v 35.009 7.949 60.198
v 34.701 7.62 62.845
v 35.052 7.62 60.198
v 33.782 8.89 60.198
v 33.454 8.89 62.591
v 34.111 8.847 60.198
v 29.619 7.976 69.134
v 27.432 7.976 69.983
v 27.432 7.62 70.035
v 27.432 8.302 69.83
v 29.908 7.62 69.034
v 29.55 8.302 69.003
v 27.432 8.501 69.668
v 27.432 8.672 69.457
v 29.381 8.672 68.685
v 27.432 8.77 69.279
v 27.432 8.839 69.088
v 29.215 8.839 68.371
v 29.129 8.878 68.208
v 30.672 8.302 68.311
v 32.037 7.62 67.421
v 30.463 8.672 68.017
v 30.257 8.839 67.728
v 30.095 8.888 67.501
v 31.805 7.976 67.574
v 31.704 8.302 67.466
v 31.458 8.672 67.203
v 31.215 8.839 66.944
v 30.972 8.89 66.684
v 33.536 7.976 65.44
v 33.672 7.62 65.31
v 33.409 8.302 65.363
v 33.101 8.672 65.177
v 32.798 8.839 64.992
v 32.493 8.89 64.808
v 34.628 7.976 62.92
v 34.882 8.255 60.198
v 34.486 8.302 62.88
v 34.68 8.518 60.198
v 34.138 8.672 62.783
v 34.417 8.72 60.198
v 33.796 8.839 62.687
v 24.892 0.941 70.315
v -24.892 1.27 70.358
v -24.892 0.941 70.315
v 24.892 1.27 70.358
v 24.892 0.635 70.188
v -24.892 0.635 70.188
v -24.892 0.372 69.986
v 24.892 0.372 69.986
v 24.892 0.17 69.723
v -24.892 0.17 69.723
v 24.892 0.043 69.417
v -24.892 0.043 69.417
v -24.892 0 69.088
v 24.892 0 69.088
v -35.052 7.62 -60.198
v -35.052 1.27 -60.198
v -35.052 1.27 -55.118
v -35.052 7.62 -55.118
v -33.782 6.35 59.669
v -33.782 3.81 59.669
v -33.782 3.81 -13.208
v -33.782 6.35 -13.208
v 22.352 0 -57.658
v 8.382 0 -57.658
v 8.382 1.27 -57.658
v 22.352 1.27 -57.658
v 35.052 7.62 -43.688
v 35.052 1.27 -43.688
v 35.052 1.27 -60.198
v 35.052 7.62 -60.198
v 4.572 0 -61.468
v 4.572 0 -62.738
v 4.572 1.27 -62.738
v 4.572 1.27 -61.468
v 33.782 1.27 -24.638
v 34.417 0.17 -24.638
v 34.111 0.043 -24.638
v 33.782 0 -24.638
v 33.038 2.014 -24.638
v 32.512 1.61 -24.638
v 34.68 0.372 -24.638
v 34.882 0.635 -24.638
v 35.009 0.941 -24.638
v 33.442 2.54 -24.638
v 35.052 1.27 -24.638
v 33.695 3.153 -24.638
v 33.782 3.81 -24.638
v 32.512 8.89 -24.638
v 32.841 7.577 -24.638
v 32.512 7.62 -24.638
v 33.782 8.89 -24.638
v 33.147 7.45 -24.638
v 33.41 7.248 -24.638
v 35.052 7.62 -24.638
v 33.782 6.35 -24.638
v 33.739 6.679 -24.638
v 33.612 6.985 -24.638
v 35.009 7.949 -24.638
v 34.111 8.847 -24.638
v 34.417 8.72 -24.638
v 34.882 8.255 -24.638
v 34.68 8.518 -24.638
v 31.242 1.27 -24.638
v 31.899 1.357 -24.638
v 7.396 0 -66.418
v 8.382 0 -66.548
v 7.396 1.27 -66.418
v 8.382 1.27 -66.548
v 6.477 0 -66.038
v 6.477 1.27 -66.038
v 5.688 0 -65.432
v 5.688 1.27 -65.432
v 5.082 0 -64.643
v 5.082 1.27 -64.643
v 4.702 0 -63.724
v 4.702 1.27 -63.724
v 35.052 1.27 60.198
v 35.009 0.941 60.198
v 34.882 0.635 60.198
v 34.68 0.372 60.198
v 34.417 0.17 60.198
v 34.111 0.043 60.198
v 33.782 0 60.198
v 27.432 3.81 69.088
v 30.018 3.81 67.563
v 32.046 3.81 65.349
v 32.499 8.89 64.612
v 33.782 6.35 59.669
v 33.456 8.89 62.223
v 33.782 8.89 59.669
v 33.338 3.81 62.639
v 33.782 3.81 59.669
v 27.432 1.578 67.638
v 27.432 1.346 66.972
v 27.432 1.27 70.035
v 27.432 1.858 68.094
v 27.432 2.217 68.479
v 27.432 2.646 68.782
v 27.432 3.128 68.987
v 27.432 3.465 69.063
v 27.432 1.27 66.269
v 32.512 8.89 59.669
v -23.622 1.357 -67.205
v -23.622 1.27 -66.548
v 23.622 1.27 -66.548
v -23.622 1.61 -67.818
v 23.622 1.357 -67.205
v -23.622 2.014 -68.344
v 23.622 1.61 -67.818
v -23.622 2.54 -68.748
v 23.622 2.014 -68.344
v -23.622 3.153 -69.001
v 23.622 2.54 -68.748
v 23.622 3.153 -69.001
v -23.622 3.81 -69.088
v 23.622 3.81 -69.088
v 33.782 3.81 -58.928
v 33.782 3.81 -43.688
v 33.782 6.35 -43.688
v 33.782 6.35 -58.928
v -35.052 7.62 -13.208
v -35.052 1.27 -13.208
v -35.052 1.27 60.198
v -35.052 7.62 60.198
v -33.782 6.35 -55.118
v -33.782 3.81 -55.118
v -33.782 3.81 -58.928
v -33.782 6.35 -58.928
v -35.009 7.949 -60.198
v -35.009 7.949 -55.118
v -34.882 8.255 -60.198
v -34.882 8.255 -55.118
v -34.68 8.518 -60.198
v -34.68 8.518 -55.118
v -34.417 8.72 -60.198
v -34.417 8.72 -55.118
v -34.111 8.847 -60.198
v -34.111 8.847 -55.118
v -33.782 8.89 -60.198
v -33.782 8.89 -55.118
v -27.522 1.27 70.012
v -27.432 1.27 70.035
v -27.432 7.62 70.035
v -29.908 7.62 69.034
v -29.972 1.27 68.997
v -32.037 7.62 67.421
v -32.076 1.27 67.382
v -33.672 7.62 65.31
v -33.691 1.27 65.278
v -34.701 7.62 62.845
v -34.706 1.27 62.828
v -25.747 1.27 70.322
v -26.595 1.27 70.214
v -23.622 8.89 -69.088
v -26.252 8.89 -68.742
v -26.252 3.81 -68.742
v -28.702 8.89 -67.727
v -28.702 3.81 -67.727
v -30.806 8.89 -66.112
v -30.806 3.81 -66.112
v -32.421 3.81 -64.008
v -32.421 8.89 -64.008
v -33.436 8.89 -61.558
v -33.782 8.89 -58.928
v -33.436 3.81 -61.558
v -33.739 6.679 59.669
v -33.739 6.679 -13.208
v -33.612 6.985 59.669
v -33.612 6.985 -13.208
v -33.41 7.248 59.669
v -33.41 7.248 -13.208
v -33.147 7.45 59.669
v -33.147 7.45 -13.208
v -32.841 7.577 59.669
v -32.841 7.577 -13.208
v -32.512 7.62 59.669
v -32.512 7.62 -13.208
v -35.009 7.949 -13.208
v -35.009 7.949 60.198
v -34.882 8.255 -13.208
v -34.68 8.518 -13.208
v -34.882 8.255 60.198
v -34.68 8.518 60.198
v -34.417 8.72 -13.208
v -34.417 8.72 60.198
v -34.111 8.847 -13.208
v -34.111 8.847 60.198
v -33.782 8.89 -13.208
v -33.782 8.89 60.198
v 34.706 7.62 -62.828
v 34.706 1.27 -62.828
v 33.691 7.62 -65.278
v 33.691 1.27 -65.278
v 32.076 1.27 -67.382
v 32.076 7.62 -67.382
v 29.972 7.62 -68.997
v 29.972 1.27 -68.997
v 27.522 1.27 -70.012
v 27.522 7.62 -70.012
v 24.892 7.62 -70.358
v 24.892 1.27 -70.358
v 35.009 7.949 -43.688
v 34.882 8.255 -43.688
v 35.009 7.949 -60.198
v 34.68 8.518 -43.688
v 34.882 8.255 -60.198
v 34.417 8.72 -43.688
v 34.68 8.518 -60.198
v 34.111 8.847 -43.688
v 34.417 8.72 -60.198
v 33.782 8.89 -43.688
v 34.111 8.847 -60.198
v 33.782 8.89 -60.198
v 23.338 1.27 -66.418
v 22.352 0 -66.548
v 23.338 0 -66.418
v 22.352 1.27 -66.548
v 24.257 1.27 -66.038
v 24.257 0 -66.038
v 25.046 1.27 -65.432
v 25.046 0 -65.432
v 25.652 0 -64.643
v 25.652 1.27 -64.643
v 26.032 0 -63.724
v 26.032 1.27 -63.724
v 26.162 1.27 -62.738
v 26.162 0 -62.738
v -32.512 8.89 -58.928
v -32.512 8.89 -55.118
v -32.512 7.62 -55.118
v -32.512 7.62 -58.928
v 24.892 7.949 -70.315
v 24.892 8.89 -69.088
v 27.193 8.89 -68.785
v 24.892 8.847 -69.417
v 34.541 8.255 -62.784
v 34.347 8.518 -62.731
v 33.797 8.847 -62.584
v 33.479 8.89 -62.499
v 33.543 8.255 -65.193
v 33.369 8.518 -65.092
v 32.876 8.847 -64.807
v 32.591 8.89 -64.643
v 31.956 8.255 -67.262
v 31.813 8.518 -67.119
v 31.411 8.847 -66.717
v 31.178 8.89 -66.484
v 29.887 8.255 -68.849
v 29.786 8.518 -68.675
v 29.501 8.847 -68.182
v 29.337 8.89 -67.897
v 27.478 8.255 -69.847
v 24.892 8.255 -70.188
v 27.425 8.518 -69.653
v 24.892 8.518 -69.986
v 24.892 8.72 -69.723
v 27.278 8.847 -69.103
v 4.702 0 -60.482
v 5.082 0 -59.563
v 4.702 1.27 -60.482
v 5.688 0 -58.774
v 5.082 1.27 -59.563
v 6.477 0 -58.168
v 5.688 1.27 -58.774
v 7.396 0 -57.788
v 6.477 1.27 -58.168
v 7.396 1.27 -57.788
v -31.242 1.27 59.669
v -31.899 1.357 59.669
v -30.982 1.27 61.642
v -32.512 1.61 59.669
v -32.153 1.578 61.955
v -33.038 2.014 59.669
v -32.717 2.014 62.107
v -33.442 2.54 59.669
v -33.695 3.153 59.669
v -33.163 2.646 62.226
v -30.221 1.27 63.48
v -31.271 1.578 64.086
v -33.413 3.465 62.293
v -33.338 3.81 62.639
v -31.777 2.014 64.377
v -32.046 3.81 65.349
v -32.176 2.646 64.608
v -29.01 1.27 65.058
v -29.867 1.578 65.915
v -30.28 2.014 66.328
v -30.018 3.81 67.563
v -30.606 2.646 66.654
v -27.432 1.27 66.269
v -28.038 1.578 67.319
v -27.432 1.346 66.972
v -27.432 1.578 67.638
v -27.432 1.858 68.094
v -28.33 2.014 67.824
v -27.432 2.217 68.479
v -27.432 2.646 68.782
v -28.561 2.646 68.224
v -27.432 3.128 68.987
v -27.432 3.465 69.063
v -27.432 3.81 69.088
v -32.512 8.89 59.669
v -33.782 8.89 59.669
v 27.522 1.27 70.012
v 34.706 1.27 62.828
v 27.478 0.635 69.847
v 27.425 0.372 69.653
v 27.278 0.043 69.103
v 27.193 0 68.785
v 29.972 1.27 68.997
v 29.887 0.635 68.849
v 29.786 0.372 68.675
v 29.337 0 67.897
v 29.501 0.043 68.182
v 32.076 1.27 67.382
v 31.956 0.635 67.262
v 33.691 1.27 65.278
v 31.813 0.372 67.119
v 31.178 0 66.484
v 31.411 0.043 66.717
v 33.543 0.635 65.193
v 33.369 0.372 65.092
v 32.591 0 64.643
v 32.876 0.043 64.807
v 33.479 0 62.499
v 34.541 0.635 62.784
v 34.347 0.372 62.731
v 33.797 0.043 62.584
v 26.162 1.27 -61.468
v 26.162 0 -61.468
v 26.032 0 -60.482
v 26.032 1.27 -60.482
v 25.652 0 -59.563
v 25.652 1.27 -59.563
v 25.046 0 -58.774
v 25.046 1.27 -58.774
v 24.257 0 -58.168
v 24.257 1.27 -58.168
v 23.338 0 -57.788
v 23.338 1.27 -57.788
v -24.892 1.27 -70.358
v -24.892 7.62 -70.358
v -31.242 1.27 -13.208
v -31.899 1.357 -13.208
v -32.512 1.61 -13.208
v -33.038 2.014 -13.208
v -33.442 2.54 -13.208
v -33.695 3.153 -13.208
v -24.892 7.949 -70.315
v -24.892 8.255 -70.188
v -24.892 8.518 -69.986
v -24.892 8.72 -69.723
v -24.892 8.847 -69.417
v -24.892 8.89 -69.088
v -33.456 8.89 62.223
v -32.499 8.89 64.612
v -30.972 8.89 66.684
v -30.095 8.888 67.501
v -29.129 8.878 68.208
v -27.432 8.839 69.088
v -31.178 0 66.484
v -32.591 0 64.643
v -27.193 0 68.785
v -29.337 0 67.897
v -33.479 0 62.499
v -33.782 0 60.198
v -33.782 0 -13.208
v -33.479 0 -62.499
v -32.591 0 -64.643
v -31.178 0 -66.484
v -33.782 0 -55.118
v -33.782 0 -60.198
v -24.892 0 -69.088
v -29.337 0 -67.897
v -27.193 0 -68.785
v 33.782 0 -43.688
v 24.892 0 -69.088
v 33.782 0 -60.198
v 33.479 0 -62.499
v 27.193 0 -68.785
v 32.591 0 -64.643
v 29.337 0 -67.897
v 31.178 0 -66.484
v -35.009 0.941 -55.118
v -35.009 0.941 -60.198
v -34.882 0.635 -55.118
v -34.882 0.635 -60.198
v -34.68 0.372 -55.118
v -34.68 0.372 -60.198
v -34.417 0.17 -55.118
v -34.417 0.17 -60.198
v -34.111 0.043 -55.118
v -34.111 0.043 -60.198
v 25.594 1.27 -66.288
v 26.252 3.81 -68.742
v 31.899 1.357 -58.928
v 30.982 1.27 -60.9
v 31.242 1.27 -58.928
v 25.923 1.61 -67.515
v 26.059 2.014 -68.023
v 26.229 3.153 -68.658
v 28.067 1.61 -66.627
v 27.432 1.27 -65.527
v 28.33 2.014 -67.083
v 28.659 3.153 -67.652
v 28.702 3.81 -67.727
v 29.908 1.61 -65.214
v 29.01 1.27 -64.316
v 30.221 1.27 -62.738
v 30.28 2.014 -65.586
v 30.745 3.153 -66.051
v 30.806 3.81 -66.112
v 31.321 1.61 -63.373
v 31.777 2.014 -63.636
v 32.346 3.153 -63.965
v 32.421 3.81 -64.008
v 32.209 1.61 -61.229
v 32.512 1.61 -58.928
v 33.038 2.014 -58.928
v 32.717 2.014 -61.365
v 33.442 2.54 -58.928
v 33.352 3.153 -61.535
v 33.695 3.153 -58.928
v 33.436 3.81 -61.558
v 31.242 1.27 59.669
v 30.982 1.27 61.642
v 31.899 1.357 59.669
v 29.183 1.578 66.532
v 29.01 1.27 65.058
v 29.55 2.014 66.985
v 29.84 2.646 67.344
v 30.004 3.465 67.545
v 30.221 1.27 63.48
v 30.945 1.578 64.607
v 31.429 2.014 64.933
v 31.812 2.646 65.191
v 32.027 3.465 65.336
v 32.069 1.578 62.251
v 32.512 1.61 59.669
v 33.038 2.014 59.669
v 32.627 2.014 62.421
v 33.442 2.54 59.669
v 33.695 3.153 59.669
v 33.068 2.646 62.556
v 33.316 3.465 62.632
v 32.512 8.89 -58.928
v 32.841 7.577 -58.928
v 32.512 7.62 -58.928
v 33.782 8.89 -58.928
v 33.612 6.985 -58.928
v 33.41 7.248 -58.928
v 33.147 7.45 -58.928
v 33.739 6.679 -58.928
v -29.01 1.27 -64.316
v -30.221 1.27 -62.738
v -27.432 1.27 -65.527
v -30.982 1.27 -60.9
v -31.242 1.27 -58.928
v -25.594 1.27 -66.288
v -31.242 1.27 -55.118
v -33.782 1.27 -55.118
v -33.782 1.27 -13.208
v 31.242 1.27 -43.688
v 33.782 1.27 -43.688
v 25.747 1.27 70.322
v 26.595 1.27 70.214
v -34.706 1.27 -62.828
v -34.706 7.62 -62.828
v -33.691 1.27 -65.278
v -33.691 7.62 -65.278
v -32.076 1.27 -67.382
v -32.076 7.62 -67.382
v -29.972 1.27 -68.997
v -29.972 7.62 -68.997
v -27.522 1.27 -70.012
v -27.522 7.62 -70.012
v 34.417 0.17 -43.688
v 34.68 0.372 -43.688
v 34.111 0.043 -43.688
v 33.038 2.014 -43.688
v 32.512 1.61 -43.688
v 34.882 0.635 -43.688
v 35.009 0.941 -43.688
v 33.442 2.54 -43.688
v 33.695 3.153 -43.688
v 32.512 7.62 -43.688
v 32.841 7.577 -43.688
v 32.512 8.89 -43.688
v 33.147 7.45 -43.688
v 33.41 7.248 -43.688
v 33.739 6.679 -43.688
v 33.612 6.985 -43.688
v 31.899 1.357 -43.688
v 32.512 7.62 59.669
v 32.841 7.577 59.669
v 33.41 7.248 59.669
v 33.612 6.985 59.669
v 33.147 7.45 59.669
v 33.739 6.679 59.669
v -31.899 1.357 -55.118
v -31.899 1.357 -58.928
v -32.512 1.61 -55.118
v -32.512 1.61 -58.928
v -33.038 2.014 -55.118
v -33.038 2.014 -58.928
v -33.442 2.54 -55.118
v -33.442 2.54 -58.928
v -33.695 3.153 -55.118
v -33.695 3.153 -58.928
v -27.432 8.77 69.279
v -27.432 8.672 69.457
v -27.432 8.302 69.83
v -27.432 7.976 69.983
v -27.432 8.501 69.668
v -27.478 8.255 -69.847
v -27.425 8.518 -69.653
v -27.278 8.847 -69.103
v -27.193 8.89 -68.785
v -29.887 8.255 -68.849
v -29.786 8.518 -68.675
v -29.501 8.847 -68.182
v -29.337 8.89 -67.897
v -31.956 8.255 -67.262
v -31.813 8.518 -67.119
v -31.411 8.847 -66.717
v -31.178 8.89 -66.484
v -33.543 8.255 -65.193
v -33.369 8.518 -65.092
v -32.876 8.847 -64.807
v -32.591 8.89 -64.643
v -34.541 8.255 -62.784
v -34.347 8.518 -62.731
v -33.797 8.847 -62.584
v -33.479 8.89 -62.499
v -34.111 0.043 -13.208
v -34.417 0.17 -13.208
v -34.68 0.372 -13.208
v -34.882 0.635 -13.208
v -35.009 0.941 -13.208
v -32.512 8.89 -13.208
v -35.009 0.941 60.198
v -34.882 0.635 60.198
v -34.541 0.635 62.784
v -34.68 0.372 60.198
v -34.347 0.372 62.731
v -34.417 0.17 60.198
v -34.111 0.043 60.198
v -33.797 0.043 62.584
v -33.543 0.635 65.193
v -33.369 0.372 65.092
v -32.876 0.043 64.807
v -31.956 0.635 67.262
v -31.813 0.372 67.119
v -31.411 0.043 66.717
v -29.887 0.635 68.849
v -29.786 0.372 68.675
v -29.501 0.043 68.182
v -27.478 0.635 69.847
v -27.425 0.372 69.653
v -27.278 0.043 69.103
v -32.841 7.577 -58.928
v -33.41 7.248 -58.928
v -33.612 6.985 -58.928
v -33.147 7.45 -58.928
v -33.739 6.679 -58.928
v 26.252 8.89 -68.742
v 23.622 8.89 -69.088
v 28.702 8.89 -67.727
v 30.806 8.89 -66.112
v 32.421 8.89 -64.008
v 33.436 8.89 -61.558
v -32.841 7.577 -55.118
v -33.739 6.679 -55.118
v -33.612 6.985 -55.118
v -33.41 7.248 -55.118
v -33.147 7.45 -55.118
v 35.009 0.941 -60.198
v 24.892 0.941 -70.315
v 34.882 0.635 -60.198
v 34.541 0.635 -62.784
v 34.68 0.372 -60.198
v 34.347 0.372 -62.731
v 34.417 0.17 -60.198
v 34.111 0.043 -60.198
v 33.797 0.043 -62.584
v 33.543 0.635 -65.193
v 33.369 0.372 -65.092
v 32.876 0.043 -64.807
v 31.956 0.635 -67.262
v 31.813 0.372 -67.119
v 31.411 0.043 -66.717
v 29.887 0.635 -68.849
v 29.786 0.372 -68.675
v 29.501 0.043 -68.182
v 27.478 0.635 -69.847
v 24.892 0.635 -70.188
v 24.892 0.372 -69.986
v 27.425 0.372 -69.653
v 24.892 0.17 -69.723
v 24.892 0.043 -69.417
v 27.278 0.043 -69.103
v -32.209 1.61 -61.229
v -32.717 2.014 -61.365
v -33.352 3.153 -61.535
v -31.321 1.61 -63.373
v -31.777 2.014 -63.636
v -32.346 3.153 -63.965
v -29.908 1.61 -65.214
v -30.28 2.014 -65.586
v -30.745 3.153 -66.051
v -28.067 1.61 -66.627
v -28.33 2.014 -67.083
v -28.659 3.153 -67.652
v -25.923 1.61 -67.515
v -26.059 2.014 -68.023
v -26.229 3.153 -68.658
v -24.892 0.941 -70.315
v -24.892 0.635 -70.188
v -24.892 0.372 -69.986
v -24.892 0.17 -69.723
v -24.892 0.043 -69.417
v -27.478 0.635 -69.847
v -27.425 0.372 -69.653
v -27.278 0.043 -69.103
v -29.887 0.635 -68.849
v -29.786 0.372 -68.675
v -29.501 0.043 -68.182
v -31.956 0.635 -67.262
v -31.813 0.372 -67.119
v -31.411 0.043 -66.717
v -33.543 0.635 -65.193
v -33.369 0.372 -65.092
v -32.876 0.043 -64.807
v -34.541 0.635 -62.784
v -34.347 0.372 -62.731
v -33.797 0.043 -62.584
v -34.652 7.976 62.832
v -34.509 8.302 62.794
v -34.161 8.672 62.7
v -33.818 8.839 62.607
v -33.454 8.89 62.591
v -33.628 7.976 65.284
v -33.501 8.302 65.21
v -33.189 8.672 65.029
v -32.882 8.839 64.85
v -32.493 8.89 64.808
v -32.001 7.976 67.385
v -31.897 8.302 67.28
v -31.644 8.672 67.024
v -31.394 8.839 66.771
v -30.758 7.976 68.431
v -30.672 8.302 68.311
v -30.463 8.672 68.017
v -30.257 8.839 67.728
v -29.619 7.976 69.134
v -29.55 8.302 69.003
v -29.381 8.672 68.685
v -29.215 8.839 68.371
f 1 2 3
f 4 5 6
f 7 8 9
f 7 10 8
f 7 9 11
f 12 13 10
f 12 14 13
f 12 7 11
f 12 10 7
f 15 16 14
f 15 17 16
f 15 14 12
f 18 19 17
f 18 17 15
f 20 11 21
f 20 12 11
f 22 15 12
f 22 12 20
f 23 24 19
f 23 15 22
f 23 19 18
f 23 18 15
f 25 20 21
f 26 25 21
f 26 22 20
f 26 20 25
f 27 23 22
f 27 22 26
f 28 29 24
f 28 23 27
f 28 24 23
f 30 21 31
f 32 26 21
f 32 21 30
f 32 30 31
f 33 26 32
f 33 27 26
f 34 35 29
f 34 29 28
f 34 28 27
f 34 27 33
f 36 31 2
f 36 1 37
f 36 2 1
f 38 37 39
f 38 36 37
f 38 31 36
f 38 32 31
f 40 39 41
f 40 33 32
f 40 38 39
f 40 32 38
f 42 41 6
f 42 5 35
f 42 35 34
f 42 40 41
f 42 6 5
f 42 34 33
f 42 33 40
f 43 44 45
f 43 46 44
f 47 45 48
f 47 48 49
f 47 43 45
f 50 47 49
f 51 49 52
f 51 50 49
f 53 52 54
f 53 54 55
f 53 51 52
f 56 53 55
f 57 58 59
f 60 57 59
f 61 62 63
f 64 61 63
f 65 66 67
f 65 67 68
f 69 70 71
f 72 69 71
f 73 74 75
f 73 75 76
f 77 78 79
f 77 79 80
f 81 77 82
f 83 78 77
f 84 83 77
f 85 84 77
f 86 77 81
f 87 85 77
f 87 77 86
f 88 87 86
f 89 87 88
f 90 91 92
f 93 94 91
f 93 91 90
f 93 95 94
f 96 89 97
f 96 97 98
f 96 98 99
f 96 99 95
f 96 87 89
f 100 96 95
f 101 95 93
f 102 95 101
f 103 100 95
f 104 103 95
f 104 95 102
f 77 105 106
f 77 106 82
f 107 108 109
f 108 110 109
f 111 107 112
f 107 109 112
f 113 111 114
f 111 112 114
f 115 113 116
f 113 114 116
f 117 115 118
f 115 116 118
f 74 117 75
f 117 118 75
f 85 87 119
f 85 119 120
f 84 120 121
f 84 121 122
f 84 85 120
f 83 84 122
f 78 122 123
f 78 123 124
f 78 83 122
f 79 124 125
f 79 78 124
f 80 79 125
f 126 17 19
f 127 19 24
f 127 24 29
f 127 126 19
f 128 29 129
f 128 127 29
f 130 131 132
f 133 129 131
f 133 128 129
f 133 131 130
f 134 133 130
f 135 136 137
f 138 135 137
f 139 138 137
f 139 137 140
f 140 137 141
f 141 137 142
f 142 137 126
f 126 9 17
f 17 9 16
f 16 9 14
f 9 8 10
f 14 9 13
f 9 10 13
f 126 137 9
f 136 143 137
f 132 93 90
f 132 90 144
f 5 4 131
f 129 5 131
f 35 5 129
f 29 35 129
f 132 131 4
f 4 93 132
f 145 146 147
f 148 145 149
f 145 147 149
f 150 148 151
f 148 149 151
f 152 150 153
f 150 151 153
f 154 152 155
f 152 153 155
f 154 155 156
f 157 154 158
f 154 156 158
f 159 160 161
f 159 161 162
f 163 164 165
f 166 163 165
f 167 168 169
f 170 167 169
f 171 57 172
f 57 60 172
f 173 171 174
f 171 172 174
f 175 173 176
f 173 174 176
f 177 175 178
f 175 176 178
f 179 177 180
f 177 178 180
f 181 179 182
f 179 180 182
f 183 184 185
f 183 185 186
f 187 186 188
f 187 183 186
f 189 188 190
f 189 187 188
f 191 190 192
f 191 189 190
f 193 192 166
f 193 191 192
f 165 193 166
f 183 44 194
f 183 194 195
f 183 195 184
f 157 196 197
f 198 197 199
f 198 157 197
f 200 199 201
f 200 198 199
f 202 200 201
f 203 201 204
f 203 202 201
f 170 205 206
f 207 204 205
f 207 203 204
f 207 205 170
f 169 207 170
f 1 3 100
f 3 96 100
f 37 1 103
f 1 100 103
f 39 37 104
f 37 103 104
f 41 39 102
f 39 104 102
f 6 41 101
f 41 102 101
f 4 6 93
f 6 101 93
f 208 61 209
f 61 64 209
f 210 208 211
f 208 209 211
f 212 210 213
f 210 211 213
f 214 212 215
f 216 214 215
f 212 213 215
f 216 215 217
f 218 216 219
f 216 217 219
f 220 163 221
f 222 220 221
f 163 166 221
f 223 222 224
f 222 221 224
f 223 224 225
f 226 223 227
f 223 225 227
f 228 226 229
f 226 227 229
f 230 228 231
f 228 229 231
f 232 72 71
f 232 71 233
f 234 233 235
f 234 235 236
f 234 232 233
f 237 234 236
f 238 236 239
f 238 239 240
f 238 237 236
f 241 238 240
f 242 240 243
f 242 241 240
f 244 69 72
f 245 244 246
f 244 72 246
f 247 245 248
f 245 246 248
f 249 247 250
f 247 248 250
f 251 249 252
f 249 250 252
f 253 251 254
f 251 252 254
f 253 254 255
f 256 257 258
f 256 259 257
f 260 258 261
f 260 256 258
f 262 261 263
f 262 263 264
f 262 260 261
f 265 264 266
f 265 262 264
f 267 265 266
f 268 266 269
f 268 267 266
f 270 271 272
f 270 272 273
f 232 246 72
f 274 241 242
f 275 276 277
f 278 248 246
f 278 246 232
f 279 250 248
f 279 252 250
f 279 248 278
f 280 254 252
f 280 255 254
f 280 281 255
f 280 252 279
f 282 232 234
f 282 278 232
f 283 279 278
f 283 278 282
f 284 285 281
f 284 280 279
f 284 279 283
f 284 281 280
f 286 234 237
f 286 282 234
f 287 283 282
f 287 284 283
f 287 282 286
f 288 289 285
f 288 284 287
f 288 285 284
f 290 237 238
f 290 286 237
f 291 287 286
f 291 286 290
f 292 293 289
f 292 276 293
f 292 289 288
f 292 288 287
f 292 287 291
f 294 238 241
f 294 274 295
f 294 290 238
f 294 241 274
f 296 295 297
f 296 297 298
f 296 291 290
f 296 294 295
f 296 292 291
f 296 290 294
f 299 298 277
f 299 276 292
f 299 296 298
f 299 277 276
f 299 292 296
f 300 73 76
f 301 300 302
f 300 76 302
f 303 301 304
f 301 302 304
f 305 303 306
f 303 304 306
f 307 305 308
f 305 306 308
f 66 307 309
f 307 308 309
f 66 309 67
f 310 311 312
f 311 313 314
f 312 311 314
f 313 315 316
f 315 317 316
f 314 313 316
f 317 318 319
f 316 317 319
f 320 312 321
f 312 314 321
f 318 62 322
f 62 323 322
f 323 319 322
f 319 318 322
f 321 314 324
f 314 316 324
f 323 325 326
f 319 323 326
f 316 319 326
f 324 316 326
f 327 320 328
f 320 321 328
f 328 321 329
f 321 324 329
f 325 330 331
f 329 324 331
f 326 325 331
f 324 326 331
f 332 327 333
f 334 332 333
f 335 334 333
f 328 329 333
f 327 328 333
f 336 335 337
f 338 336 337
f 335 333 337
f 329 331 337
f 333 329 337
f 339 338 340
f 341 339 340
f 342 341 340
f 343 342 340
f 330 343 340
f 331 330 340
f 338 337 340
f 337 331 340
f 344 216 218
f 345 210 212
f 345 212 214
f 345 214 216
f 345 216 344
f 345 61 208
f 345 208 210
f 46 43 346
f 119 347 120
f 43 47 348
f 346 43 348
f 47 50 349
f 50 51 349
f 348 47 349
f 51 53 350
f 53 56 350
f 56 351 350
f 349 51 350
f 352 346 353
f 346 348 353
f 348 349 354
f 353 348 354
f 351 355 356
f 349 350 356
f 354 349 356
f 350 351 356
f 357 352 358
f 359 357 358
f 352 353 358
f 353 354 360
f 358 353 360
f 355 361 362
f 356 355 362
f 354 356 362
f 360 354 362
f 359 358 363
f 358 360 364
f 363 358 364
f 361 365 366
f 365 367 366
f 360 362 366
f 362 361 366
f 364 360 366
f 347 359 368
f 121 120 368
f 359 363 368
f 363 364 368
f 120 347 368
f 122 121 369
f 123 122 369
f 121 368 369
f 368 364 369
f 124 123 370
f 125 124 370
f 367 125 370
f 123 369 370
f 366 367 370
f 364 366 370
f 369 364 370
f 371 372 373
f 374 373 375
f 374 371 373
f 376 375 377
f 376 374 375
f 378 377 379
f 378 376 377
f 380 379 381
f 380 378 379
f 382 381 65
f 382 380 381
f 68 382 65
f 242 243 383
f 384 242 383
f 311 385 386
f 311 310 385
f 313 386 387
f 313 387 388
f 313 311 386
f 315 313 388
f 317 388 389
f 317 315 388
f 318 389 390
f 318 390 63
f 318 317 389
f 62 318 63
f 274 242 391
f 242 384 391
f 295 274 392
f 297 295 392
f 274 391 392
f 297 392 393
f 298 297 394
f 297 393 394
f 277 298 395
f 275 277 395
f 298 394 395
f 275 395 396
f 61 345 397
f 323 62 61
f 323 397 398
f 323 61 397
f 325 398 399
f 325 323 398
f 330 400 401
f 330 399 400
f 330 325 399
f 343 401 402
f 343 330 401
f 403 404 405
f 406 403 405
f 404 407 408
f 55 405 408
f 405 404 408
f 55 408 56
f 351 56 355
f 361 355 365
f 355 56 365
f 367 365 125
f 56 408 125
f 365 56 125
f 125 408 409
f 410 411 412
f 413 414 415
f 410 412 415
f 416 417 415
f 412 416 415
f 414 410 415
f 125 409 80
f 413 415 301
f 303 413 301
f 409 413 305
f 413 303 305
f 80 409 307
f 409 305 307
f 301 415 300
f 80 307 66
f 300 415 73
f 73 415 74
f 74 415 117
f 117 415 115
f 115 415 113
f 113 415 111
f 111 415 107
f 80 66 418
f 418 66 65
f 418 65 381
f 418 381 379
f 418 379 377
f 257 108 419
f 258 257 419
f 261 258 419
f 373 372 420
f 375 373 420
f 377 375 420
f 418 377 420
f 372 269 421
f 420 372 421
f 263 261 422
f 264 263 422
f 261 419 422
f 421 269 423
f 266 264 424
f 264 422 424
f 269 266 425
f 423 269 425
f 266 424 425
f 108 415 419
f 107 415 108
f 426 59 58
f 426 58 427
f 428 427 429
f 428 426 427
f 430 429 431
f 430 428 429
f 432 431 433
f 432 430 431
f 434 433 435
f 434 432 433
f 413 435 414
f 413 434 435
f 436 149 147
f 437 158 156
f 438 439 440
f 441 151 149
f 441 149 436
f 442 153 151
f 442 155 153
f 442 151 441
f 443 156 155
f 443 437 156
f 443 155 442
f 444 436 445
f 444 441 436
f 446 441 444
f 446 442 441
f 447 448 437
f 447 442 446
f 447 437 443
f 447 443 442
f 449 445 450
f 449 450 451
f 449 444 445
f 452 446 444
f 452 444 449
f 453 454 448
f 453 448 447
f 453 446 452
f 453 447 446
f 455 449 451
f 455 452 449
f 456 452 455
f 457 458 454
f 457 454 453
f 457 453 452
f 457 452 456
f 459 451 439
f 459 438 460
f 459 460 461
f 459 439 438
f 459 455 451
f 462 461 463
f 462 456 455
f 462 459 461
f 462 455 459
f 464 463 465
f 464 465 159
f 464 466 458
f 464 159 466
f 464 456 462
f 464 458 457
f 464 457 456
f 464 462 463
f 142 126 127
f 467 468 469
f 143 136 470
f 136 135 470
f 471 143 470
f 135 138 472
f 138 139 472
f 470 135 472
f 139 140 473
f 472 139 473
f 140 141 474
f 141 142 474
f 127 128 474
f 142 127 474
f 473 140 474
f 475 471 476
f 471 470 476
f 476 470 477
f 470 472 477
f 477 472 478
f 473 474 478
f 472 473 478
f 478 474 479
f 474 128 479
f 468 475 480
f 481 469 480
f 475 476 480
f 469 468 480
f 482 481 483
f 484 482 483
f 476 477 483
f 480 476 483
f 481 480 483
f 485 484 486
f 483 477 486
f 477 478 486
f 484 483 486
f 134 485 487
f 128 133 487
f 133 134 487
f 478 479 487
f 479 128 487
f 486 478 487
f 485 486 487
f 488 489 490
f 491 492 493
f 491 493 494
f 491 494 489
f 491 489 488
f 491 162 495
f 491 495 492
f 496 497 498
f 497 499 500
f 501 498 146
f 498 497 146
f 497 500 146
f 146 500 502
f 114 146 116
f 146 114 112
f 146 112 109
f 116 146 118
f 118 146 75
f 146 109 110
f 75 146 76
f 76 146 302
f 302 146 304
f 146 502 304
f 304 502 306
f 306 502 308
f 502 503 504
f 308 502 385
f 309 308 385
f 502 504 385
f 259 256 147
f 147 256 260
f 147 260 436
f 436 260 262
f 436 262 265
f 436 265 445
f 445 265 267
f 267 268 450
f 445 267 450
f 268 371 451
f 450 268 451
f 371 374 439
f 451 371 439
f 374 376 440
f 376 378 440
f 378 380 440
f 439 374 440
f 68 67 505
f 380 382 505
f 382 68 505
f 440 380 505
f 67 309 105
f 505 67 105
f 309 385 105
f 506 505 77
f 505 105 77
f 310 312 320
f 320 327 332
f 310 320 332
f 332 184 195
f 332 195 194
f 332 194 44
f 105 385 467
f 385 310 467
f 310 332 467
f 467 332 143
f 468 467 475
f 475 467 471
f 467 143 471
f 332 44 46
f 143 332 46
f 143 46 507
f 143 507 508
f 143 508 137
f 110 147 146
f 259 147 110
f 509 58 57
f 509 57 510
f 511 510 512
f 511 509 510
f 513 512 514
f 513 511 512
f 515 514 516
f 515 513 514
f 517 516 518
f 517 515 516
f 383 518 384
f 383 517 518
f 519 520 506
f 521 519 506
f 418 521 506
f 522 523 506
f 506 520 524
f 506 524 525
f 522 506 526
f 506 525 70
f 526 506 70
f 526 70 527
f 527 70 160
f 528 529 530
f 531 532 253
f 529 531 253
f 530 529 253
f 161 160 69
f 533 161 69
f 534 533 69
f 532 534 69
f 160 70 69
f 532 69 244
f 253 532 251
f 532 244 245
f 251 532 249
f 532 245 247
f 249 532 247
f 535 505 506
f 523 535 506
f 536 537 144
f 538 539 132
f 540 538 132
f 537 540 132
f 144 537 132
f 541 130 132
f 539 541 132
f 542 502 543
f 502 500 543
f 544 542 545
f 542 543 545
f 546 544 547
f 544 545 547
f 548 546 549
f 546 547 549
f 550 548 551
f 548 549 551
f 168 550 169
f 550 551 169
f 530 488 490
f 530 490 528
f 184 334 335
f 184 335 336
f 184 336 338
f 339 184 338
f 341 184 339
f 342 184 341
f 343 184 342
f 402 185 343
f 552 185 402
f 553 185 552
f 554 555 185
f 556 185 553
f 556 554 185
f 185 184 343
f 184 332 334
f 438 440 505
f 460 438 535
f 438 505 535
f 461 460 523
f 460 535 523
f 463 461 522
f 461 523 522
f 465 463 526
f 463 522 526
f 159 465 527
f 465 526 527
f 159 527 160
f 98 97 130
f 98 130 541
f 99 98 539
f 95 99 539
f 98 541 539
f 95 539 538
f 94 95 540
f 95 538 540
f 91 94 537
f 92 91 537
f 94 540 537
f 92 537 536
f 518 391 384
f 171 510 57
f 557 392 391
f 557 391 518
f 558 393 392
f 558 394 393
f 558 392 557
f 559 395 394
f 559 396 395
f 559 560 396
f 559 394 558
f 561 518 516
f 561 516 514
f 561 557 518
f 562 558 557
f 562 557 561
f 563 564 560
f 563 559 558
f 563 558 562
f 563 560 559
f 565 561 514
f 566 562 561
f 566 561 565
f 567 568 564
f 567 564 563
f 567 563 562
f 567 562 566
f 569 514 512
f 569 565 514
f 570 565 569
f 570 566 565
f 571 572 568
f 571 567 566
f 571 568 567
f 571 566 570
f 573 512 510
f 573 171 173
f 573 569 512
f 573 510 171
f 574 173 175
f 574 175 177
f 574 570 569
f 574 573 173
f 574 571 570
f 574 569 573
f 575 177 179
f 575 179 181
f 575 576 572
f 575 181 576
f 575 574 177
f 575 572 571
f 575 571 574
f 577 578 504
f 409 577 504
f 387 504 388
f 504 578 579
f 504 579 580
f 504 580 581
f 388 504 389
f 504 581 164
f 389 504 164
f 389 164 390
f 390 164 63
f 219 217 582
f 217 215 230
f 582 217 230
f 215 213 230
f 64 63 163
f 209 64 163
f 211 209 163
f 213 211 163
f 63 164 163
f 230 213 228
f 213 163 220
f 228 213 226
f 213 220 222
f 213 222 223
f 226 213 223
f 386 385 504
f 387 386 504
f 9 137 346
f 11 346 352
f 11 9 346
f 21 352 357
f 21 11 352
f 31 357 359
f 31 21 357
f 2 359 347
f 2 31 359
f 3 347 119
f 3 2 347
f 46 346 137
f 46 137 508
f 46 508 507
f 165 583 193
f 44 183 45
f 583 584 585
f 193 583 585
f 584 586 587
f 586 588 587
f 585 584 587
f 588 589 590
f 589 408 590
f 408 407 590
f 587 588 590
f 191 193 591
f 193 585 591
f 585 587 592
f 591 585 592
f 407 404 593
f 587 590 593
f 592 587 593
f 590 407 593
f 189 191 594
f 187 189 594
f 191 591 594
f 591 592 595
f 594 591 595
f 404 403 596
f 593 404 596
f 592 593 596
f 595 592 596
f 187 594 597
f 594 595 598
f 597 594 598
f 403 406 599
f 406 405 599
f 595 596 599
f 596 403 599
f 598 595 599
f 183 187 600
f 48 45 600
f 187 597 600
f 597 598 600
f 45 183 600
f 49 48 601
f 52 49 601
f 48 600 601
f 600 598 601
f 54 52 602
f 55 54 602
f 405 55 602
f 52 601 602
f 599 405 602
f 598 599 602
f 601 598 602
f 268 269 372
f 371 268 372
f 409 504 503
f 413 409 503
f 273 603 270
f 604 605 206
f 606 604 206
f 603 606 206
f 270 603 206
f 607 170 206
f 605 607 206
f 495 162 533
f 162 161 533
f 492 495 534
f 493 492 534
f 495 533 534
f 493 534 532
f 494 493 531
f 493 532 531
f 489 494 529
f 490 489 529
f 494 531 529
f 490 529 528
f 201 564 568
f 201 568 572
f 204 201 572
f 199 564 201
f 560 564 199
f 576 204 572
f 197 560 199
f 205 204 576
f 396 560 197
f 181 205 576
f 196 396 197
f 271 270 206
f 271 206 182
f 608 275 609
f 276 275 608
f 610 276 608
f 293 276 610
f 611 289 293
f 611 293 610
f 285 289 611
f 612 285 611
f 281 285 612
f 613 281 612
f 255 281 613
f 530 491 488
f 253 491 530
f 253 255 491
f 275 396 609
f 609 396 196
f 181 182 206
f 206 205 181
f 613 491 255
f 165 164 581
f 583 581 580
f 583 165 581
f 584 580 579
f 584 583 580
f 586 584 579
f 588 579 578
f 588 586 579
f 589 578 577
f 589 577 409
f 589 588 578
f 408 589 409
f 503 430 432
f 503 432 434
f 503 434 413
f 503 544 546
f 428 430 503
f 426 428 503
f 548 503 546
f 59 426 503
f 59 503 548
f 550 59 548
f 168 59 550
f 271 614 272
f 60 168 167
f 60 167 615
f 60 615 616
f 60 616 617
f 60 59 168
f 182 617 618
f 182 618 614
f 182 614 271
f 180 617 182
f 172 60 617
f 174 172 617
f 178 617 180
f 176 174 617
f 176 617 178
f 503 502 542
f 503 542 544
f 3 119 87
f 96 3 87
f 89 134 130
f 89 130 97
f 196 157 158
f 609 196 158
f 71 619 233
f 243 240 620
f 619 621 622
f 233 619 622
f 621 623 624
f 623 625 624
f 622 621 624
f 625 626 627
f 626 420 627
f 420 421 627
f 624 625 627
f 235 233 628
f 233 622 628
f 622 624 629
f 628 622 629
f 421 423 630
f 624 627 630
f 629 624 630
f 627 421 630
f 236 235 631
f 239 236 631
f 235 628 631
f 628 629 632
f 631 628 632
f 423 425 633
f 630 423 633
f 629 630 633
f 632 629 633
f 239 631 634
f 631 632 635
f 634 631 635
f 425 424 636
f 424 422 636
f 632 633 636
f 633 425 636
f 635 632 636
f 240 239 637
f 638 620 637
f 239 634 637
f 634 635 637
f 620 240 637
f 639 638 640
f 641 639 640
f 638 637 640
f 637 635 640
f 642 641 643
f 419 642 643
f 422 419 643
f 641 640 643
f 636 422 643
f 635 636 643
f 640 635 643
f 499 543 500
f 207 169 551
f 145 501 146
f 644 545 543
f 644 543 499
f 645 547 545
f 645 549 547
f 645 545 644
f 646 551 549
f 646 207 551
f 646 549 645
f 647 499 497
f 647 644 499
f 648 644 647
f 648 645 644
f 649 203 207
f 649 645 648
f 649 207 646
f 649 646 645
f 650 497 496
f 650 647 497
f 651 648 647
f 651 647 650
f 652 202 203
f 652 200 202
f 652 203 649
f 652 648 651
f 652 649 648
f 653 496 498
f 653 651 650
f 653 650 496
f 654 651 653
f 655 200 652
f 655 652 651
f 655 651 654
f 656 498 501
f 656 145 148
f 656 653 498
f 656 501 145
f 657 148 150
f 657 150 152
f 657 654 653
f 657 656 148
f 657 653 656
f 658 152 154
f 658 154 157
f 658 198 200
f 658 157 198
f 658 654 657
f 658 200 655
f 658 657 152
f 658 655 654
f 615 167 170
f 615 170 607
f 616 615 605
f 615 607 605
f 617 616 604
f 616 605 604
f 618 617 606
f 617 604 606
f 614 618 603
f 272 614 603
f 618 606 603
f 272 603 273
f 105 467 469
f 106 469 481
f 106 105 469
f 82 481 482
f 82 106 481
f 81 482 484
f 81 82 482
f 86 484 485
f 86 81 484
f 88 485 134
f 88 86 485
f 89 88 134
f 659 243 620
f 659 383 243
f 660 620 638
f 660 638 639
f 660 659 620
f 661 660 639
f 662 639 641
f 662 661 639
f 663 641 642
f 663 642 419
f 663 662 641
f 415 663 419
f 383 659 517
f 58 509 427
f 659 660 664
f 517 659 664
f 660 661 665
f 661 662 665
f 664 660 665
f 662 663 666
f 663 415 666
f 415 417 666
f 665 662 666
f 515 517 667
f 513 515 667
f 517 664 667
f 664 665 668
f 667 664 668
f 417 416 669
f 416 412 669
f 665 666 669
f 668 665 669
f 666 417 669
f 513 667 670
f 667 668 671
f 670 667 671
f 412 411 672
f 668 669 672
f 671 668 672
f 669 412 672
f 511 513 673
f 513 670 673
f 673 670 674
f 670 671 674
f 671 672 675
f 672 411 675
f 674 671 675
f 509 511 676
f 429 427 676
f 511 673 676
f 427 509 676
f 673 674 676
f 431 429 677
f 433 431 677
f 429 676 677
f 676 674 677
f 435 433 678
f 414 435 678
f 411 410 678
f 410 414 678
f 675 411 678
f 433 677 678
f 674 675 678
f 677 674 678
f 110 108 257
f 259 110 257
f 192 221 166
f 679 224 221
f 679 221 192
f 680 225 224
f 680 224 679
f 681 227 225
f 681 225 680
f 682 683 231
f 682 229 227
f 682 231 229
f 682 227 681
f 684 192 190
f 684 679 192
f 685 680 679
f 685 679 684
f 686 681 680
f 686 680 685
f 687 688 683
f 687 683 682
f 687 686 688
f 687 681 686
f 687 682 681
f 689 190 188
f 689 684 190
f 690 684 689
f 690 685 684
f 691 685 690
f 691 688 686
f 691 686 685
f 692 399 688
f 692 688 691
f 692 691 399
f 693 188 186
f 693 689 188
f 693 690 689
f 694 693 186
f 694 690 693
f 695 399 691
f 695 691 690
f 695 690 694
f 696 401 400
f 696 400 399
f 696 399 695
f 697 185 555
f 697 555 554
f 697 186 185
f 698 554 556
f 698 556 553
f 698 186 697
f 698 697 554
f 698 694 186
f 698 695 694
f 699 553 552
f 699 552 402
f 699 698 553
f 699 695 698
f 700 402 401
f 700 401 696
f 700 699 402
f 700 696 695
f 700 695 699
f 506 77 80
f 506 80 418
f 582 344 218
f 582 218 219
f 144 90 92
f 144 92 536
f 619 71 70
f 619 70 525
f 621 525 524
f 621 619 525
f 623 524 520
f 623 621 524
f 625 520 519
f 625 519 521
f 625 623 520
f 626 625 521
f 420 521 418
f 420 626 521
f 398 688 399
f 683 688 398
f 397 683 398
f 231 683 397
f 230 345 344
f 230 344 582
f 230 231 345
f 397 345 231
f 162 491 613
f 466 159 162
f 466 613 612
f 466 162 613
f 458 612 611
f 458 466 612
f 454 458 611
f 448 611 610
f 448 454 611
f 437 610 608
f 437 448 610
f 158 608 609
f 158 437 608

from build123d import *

# Parameters (mm, degrees)
SKETCH1_W           = 70.104
SKETCH1_H           = 140.716
BOSS_EXTRUDE1_DEPTH = 1.27
SKETCH2_W           = 67.564
SKETCH2_H           = 138.176
BOSS_EXTRUDE2_DEPTH = 7.62
SKETCH3_W           = 41.91
SKETCH3_H           = 7.62
CUT_EXTRUDE1_DEPTH  = 1.27
SKETCH5_W           = 19.05
SKETCH5_H           = 7.62
CUT_EXTRUDE2_DEPTH  = 1.27
SKETCH6_W           = 54.864
SKETCH6_H           = 7.62
CUT_EXTRUDE3_DEPTH  = 1.27
SKETCH7_W           = 21.59
SKETCH7_H           = 8.89
CUT_EXTRUDE4_DEPTH  = 1.27
FILLET1_R           = 10.16
FILLET2_R           = 10.16
SKETCH8_W           = 3.81
SKETCH8_H           = 1.27
BOSS_EXTRUDE3_DEPTH = 1.27
SKETCH14_W          = 15.24
SKETCH14_H          = 1.27
BOSS_EXTRUDE7_DEPTH = 1.27
SKETCH19_W          = 84.307427921
SKETCH19_H          = 1.27
BOSS_EXTRUDE8_DEPTH = 1.27
SKETCH20_W          = 72.877427921
SKETCH20_H          = 1.27
BOSS_EXTRUDE9_DEPTH = 1.27
FILLET9_R           = 3.81
FILLET12_R          = 1.27
FILLET15_R          = 1.27
FILLET16_R          = 2.54
SKETCH28_W          = 1.27
SKETCH28_H          = 19.05
SKETCH28_H_2        = 41.91
CUT_EXTRUDE10_DEPTH = 1.27
FILLET18_R          = 1.27


# Some blends are built 0.0001 mm under size
with BuildPart() as part:
    # Sketch1 → Boss-Extrude1 (new body)
    with BuildSketch(Plane(origin=(0, 0, 0), x_dir=(1, 0, 0), z_dir=(0, 1, 0))):
        Rectangle(SKETCH1_W, SKETCH1_H)
    extrude(amount=BOSS_EXTRUDE1_DEPTH)

    # Sketch2 → Boss-Extrude2 (add)
    with BuildSketch(Plane(origin=(0, 1.27, 0), x_dir=(1, 0, 0), z_dir=(0, 1, 0))):
        Polygon((-35.052, -70.358), (0, -70.358), (35.052, -70.358), (35.052, 70.358), (-35.052, 70.358), align=None)
        Rectangle(SKETCH2_W, SKETCH2_H, mode=Mode.SUBTRACT)
    extrude(amount=BOSS_EXTRUDE2_DEPTH)

    # Sketch3 → Cut-Extrude1 (cut)
    with BuildSketch(Plane.ZY.offset(35.052)):
        with Locations((-34.163, 5.08)):
            Rectangle(SKETCH3_W, SKETCH3_H)
    extrude(amount=-CUT_EXTRUDE1_DEPTH, mode=Mode.SUBTRACT)

    # Sketch5 → Cut-Extrude2 (cut)
    with BuildSketch(Plane(origin=(35.052, 0, 0), x_dir=(0, 0, -1), z_dir=(1, 0, 0))):
        with Locations((34.163, 5.08)):
            Rectangle(SKETCH5_W, SKETCH5_H)
    extrude(amount=-CUT_EXTRUDE2_DEPTH, mode=Mode.SUBTRACT)

    # Sketch6 → Cut-Extrude3 (cut)
    with BuildSketch(Plane.XY.offset(70.358)):
        with Locations((0, 5.08)):
            Rectangle(SKETCH6_W, SKETCH6_H)
    extrude(amount=-CUT_EXTRUDE3_DEPTH, mode=Mode.SUBTRACT)

    # Sketch7 → Cut-Extrude4 (cut)
    with BuildSketch(Plane.XZ):
        with Locations((15.367, -62.103)):
            Rectangle(SKETCH7_W, SKETCH7_H)
    extrude(amount=-CUT_EXTRUDE4_DEPTH, mode=Mode.SUBTRACT)

    # Fillet1
    # the kernel refuses this fillet: 10.16 mm, written as the material it adds along each edge
    with BuildSketch(Plane(origin=(33.782, 1.27, -69.088), x_dir=(0, 0, 1), z_dir=(0, 1, 0)), Plane(origin=(-33.782, 1.27, -69.088), x_dir=(1, 0, 0), z_dir=(0, 1, 0))) as fillet1_piece_1:
        with BuildLine():
            CenterArc((FILLET1_R, -FILLET1_R), FILLET1_R, 90, 90)
            Line((0, -FILLET1_R), (-FILLET1_R * 0.02, -FILLET1_R))
            Line((-FILLET1_R * 0.02, -FILLET1_R), (-FILLET1_R * 0.02, FILLET1_R * 0.02))
            Line((-FILLET1_R * 0.02, FILLET1_R * 0.02), (FILLET1_R, FILLET1_R * 0.02))
            Line((FILLET1_R, FILLET1_R * 0.02), (FILLET1_R, 0))
        make_face()
    extrude(amount=7.62)
    with BuildSketch(Plane(origin=(-33.782, 1.27, 69.088), x_dir=(0, 0, -1), z_dir=(0, 1, 0))) as fillet1_piece_2:
        with BuildLine():
            CenterArc((9.418572079, -10.16), FILLET1_R, 90, 67.975687163)
            Line((0, -6.35), (-0.188371442, -6.2738))
            ThreePointArc((-0.188371442, -6.2738), (-0.2032, -3.175), (-0.2032, 0))
            Line((-0.2032, 0), (0, 0.2032))
            Line((0, 0.2032), (9.418572079, 0.2032))
            Line((9.418572079, 0.2032), (9.418572079, 0))
        make_face()
    extrude(amount=7.62)
    with BuildSketch(Plane(origin=(33.782, 1.27, 69.088), x_dir=(-1, 0, 0), z_dir=(0, 1, 0))) as fillet1_piece_3:
        with BuildLine():
            CenterArc((10.16, -9.418572079), FILLET1_R, 112.024312837, 67.975687163)
            Line((0, -9.418572079), (-0.2032, -9.418572079))
            Line((-0.2032, -9.418572079), (-0.2032, 0))
            Line((-0.2032, 0), (0, 0.2032))
            ThreePointArc((0, 0.2032), (3.175, 0.2032), (6.2738, 0.188371442))
            Line((6.2738, 0.188371442), (6.35, 0))
        make_face()
    extrude(amount=7.62)

    # Fillet2
    fillet2_edges = [part.edges().sort_by_distance(p)[0] for p in [
        (-35.052, 4.445, -70.358),
        (35.052, 4.445, -70.358),
        (35.052, 4.445, 70.358),
        (-35.052, 4.445, 70.358),
    ]]
    fillet(fillet2_edges, radius=FILLET2_R)

    # Sketch8 → Boss-Extrude3 (add)
    with BuildSketch(Plane(origin=(-33.782, 0, 0), x_dir=(0, 0, -1), z_dir=(1, 0, 0))):
        with Locations((57.023, 8.255)):
            Rectangle(SKETCH8_W, SKETCH8_H)
    extrude(amount=BOSS_EXTRUDE3_DEPTH)

    # Sketch14 → Boss-Extrude7 (add)
    with BuildSketch(Plane.ZY.offset(-33.782)):
        with Locations((-51.308, 8.255)):
            Rectangle(SKETCH14_W, SKETCH14_H)
    extrude(amount=BOSS_EXTRUDE7_DEPTH)

    # Sketch19 → Boss-Extrude8 (add)
    with BuildSketch(Plane.ZY.offset(-33.782)):
        with Locations((17.515713961, 8.255)):
            Rectangle(SKETCH19_W, SKETCH19_H)
    extrude(amount=BOSS_EXTRUDE8_DEPTH)

    # Sketch20 → Boss-Extrude9 (add)
    with BuildSketch(Plane(origin=(-33.782, 0, 0), x_dir=(0, 0, -1), z_dir=(1, 0, 0))):
        with Locations((-23.230713961, 8.255)):
            Rectangle(SKETCH20_W, SKETCH20_H)
    extrude(amount=BOSS_EXTRUDE9_DEPTH)

    # Fillet9
    fillet9_edges = [part.edges().sort_by_distance(p)[0] for p in [
        (26.162, 0.635, -57.658),
        (26.162, 0.635, -66.548),
        (4.572, 0.635, -66.548),
        (4.572, 0.635, -57.658),
    ]]
    fillet(fillet9_edges, radius=FILLET9_R)

    # Fillet12
    fillet12_edges = [part.edges().sort_by_distance(p)[0] for p in [
        (32.076204897, 0, 67.382204897),
        (0, 0, 70.358),
        (-32.076204897, 0, 67.382204897),
        (-35.052, 0, 0),
        (-32.076204897, 0, -67.382204897),
        (0, 0, -70.358),
        (32.076204897, 0, -67.382204897),
        (35.052, 0, 0),
    ]]
    fillet(fillet12_edges, radius=FILLET12_R - 0.0001)  # a hair under: the kernel refuses the full size

    # Fillet15
    fillet15_edges = [part.edges().sort_by_distance(p)[0] for p in [
        (-35.052, 8.89, -57.658),
        (0, 8.89, -70.358),
        (-32.076204897, 8.89, -67.382204897),
        (35.052, 8.89, 17.78),
        (-35.052, 8.89, 23.495),
        (32.076204897, 8.89, -67.382204897),
        (32.924185257, 8.89, 66.419703947),
        (-32.924185257, 8.89, 66.419703947),
        (35.052, 8.89, -51.943),
    ]]
    fillet(fillet15_edges, radius=FILLET15_R - 0.0001)  # a hair under: the kernel refuses the full size

    # Fillet16
    fillet16_edges = [part.edges().sort_by_distance(p)[0] for p in [
        (0, 1.27, -69.088),
        (-33.782, 1.27, -57.023),
        (33.782, 1.27, 17.515713961),
        (-30.806204897, 1.27, -66.112204897),
        (30.806204897, 1.27, -66.112204897),
        (32.046226968, 1.27, 65.349040584),
        (-32.046226968, 1.27, 65.349040584),
        (-33.782, 1.27, 23.230713961),
        (33.782, 1.27, -51.308),
    ]]
    fillet(fillet16_edges, radius=FILLET16_R - 0.0001)  # a hair under: the kernel refuses the full size

    # Sketch28 → Cut-Extrude10 (cut)
    with BuildSketch(Plane(origin=(0, 1.27, 0), x_dir=(1, 0, 0), z_dir=(0, 1, 0))):
        with Locations((34.417, 34.163)):
            Rectangle(SKETCH28_W, SKETCH28_H)
        with Locations((-34.417, 34.163)):
            Rectangle(SKETCH28_W, SKETCH28_H_2)
    extrude(amount=-CUT_EXTRUDE10_DEPTH, mode=Mode.SUBTRACT)

    # Fillet18
    fillet18_edges = [part.edges().sort_by_distance(p)[0] for p in [
        (33.782, 7.62, -51.308),
        (-33.782, 7.62, -57.023),
        (33.782, 7.62, 17.515713961),
        (-33.782, 7.62, 23.230713961),
    ]]
    fillet(fillet18_edges, radius=FILLET18_R - 0.0001)  # a hair under: the kernel refuses the full size


solid = part.part
